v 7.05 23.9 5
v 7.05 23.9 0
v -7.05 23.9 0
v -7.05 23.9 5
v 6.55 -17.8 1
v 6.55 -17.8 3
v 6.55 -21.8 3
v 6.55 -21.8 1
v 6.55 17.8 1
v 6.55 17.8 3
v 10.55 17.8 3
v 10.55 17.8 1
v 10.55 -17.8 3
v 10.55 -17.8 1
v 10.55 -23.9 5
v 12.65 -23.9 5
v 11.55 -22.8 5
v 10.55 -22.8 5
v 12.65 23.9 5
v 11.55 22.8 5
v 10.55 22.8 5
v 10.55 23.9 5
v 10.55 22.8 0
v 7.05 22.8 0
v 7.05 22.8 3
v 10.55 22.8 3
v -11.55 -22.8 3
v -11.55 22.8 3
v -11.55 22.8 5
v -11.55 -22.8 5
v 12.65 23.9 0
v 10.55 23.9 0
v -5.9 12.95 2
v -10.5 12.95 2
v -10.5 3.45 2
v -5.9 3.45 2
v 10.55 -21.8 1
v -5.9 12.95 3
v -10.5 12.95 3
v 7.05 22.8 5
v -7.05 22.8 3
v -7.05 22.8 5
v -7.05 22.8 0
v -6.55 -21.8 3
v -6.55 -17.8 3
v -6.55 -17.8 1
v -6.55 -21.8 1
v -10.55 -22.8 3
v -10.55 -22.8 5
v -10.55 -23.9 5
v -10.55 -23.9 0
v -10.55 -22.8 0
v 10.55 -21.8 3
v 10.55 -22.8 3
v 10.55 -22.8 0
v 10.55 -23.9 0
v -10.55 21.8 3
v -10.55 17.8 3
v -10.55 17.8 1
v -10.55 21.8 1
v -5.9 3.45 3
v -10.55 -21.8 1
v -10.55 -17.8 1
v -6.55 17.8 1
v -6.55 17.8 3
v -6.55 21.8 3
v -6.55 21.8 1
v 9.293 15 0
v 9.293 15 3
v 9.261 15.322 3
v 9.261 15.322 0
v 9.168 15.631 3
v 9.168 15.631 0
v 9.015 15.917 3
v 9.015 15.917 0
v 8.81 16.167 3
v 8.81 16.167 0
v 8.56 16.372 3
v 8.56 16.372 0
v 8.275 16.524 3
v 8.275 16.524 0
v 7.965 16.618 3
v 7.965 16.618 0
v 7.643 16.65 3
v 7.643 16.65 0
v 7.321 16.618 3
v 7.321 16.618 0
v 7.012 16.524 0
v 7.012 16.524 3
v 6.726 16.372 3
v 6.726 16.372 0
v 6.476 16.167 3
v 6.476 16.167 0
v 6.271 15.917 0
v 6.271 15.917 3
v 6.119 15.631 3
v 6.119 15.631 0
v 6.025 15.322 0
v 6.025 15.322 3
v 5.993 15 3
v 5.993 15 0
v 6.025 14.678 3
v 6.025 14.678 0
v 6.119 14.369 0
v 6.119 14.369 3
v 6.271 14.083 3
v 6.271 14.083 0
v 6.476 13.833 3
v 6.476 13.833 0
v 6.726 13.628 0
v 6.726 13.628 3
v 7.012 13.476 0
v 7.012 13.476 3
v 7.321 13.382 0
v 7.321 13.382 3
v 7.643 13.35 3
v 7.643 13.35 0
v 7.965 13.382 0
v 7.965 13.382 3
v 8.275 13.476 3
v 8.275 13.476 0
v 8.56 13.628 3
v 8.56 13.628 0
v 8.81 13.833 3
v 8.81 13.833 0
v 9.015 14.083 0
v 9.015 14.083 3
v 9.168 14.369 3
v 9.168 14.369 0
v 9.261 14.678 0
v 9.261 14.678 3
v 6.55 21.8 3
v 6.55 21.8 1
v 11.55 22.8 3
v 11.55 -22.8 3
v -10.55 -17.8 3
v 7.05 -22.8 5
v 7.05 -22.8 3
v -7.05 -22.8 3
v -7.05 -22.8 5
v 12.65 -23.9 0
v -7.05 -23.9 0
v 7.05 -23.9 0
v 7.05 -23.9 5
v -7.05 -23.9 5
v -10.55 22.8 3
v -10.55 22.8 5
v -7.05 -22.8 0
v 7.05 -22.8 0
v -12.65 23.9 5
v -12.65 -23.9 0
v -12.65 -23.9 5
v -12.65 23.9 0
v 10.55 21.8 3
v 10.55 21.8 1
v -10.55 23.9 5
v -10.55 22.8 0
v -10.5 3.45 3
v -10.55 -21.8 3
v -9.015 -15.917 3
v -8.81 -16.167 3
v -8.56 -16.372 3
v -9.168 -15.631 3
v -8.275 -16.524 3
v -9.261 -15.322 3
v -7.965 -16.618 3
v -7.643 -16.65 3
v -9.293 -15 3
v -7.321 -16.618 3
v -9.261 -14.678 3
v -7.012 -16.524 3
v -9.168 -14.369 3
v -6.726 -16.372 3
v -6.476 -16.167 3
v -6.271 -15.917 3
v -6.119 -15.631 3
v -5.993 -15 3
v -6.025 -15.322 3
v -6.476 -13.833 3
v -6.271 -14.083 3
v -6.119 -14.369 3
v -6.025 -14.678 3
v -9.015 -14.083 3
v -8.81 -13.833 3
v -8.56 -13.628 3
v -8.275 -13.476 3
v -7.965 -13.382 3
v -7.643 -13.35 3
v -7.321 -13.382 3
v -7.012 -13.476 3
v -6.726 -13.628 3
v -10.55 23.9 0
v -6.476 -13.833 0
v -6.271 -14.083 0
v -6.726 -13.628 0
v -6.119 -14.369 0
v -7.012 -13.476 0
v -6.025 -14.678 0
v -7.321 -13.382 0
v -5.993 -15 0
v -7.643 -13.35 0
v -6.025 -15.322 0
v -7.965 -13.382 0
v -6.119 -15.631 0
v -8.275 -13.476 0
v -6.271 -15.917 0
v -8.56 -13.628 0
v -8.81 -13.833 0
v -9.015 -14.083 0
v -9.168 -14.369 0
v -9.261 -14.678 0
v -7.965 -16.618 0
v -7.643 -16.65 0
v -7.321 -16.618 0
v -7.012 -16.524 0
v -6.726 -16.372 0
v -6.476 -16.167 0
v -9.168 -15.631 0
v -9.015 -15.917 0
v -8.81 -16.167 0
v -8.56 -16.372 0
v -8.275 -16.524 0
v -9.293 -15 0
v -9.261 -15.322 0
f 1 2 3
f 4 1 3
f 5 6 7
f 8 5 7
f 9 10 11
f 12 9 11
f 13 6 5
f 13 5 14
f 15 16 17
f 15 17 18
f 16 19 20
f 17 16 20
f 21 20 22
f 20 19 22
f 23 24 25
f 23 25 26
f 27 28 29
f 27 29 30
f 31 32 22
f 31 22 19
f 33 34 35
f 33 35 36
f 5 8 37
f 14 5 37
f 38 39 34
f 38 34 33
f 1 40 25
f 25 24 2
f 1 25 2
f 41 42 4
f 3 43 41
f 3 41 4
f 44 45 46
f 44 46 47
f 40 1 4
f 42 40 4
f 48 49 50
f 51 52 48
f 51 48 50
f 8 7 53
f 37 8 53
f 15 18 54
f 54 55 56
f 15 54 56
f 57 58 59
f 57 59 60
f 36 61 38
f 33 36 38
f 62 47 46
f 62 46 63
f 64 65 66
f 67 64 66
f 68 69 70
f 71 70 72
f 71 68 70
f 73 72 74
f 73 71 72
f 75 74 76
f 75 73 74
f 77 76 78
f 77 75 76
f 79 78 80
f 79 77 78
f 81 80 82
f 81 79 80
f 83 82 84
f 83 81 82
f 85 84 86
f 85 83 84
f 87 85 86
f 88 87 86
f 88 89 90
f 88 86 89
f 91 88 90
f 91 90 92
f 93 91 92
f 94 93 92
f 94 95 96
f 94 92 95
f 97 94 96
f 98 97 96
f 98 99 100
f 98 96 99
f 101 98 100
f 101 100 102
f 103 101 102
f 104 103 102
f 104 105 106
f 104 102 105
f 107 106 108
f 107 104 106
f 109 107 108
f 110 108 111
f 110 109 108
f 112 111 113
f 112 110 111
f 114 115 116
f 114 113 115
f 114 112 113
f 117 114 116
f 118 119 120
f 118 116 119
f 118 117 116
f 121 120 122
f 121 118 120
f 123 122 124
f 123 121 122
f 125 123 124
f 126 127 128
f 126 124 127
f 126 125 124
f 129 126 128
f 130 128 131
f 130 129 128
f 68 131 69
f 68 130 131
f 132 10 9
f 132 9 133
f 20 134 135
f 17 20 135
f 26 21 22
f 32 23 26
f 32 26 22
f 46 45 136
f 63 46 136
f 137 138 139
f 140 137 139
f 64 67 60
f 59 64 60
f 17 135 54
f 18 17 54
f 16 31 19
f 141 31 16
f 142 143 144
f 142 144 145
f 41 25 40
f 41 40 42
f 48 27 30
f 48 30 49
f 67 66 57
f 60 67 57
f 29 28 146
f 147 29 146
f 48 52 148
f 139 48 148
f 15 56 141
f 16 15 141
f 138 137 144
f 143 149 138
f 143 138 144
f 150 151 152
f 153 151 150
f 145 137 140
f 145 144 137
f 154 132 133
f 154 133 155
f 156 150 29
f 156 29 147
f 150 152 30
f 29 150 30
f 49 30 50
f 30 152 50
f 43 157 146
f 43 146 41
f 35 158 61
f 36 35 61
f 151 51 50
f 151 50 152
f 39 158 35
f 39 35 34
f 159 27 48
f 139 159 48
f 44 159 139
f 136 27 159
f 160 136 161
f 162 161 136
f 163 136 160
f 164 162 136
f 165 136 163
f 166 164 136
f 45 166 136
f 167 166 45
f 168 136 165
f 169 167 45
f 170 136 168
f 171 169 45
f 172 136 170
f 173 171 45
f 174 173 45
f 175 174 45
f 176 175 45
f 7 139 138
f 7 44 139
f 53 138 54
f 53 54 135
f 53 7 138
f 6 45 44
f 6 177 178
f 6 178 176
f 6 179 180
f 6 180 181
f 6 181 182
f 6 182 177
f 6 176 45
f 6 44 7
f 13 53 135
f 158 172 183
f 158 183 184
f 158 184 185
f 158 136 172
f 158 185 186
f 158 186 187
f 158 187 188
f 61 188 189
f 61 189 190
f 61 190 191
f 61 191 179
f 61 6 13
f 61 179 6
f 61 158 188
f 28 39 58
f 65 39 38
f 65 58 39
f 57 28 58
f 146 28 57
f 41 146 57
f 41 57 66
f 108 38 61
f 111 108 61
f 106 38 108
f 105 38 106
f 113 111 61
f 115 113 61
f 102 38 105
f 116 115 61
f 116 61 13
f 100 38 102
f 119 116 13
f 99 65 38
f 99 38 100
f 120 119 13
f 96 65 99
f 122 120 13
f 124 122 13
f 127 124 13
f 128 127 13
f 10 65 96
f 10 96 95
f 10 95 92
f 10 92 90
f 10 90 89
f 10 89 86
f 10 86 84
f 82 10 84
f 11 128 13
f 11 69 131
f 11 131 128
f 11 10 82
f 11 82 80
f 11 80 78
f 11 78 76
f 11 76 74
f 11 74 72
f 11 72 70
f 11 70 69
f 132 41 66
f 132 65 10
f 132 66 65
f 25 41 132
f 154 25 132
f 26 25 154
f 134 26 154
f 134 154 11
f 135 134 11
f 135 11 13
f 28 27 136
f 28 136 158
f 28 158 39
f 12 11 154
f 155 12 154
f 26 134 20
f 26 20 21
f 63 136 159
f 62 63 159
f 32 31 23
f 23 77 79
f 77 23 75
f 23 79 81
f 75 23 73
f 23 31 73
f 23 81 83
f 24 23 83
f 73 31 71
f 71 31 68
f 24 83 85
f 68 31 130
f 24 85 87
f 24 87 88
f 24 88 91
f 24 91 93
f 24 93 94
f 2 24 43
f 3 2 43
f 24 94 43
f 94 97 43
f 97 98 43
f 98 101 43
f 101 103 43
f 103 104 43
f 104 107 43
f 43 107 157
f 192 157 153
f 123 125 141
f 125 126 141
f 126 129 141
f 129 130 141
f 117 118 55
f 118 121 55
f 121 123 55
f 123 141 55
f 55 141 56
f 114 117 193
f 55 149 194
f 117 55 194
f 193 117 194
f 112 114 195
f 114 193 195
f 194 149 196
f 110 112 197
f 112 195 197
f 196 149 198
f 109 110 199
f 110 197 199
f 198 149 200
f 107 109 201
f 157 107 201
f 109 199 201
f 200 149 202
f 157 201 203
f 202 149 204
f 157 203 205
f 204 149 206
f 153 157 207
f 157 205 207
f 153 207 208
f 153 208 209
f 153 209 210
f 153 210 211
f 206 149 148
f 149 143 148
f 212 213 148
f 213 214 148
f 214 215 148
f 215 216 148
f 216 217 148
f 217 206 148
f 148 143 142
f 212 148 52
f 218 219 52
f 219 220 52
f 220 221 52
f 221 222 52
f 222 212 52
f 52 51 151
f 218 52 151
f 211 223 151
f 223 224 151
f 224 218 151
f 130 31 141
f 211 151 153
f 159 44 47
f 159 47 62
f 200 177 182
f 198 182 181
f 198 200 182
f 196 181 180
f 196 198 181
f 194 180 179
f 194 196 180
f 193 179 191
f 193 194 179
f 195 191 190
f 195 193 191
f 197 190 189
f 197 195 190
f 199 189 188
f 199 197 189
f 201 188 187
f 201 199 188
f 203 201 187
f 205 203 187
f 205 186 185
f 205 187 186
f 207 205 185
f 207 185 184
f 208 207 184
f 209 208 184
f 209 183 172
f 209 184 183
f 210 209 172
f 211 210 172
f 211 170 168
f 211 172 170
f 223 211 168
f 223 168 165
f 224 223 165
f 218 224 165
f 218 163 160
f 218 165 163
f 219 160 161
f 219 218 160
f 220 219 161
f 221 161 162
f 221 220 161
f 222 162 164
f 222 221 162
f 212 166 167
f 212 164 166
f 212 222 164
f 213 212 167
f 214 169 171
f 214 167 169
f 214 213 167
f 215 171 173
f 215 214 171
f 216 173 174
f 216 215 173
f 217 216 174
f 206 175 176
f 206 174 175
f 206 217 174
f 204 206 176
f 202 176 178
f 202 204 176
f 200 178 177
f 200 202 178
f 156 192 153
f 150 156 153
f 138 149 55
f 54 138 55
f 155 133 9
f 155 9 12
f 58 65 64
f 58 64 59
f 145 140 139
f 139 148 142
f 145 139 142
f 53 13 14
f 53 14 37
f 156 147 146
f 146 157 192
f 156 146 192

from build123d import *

# Parameters (mm, degrees)
SKETCH_W                   = 21.1
SKETCH_H                   = 43.6
PAD_DEPTH                  = 3
SKETCH004_W                = 23.1
SKETCH004_H                = 45.6
PAD001_DEPTH               = 3
SKETCH005_W                = 7.05
SKETCH005_H                = 1.1
PAD002_DEPTH               = 5
SKETCH005_MIRRORED002_2_W  = 7.05
SKETCH005_MIRRORED002_2_H  = 1.1
PAD002_MIRRORED002_2_DEPTH = 5
SKETCH002_W                = 4.6
SKETCH002_H                = 9.5
POCKET_DEPTH               = 1
SKETCH001_R                = 1.65
POCKET001_DEPTH            = 0.001
POCKET001_DEPTH_BACK       = -5.001
SKETCH003_W                = 4
SKETCH003_H                = 4
POCKET002_DEPTH            = 2
SKETCH003_MIRRORED_2_W     = 4
SKETCH003_MIRRORED_2_H     = 4
POCKET002_MIRRORED_2_DEPTH = 2


with BuildPart() as part:
    # Sketch → Pad (new body)
    with BuildSketch(Plane.XY):
        Rectangle(SKETCH_W, SKETCH_H)
    extrude(amount=PAD_DEPTH)

    # Sketch004 → Pad001 (join)
    with BuildSketch(Plane.XY):
        Rectangle(SKETCH004_W, SKETCH004_H)
    extrude(amount=PAD001_DEPTH)

    # Sketch005 → Pad002 (join)
    with BuildSketch(Plane.XY):
        with Locations((3.525, 23.35)):
            Rectangle(SKETCH005_W, SKETCH005_H)
        Polygon((11.55, 22.8), (10.55, 22.8), (10.55, 23.9), (12.65, 23.9), (12.65, 0), (11.55, 0), align=None)
    pad002 = extrude(amount=PAD002_DEPTH)

    # Sketch005 Mirrored002 2 → Pad002 Mirrored002 2 (add)
    with BuildSketch(Plane(origin=(0, 0, 0), x_dir=(-1, 0, 0), z_dir=(0, 0, -1))):
        with Locations((3.525, 23.35)):
            Rectangle(SKETCH005_MIRRORED002_2_W, SKETCH005_MIRRORED002_2_H)
        Polygon((11.55, 22.8), (10.55, 22.8), (10.55, 23.9), (12.65, 23.9), (12.65, 0), (11.55, 0), align=None)
    pad002_mirrored002_2 = extrude(amount=-PAD002_MIRRORED002_2_DEPTH)

    # Mirrored003: Pad002, Pad002 Mirrored002 2 across Sketch005 H_Axis
    add(pad002.mirror(Plane.ZX))
    add(pad002_mirrored002_2.mirror(Plane.ZX))

    # Sketch002 → Pocket (cut)
    with BuildSketch(Plane(origin=(-8.2, 8.2, 3), x_dir=(1, 0, 0), z_dir=(0, 0, 1))):
        Rectangle(SKETCH002_W, SKETCH002_H)
    extrude(amount=-POCKET_DEPTH, mode=Mode.SUBTRACT)

    # Sketch001 → Pocket001 (cut, two sides)
    with BuildSketch(Plane.XY) as pocket001_sk:
        with Locations((7.643116, 15)):
            Circle(SKETCH001_R)
        with Locations((-7.643116, -15)):
            Circle(SKETCH001_R)
    extrude(amount=-POCKET001_DEPTH, mode=Mode.SUBTRACT)
    extrude(pocket001_sk.sketch, amount=-POCKET001_DEPTH_BACK, mode=Mode.SUBTRACT)

    # Sketch003 → Pocket002 (cut)
    with BuildSketch(Plane.XY.offset(3)):
        with Locations((8.55, 19.8)):
            Rectangle(SKETCH003_W, SKETCH003_H)
    pocket002 = extrude(amount=-POCKET002_DEPTH, mode=Mode.SUBTRACT)

    # Sketch003 Mirrored 2 → Pocket002 Mirrored 2 (cut)
    with BuildSketch(Plane(origin=(0, 0, 3), x_dir=(-1, 0, 0), z_dir=(0, 0, -1))):
        with Locations((8.55, 19.8)):
            Rectangle(SKETCH003_MIRRORED_2_W, SKETCH003_MIRRORED_2_H)
    pocket002_mirrored_2 = extrude(amount=POCKET002_MIRRORED_2_DEPTH, mode=Mode.SUBTRACT)

    # Mirrored001: Pocket002, Pocket002 Mirrored 2 across Sketch003 H_Axis
    add(pocket002.mirror(Plane(origin=(0, 0, 3), x_dir=(0, 0, 1), z_dir=(0, 1, 0))), mode=Mode.SUBTRACT)
    add(pocket002_mirrored_2.mirror(Plane(origin=(0, 0, 3), x_dir=(0, 0, 1), z_dir=(0, 1, 0))), mode=Mode.SUBTRACT)


solid = part.part
